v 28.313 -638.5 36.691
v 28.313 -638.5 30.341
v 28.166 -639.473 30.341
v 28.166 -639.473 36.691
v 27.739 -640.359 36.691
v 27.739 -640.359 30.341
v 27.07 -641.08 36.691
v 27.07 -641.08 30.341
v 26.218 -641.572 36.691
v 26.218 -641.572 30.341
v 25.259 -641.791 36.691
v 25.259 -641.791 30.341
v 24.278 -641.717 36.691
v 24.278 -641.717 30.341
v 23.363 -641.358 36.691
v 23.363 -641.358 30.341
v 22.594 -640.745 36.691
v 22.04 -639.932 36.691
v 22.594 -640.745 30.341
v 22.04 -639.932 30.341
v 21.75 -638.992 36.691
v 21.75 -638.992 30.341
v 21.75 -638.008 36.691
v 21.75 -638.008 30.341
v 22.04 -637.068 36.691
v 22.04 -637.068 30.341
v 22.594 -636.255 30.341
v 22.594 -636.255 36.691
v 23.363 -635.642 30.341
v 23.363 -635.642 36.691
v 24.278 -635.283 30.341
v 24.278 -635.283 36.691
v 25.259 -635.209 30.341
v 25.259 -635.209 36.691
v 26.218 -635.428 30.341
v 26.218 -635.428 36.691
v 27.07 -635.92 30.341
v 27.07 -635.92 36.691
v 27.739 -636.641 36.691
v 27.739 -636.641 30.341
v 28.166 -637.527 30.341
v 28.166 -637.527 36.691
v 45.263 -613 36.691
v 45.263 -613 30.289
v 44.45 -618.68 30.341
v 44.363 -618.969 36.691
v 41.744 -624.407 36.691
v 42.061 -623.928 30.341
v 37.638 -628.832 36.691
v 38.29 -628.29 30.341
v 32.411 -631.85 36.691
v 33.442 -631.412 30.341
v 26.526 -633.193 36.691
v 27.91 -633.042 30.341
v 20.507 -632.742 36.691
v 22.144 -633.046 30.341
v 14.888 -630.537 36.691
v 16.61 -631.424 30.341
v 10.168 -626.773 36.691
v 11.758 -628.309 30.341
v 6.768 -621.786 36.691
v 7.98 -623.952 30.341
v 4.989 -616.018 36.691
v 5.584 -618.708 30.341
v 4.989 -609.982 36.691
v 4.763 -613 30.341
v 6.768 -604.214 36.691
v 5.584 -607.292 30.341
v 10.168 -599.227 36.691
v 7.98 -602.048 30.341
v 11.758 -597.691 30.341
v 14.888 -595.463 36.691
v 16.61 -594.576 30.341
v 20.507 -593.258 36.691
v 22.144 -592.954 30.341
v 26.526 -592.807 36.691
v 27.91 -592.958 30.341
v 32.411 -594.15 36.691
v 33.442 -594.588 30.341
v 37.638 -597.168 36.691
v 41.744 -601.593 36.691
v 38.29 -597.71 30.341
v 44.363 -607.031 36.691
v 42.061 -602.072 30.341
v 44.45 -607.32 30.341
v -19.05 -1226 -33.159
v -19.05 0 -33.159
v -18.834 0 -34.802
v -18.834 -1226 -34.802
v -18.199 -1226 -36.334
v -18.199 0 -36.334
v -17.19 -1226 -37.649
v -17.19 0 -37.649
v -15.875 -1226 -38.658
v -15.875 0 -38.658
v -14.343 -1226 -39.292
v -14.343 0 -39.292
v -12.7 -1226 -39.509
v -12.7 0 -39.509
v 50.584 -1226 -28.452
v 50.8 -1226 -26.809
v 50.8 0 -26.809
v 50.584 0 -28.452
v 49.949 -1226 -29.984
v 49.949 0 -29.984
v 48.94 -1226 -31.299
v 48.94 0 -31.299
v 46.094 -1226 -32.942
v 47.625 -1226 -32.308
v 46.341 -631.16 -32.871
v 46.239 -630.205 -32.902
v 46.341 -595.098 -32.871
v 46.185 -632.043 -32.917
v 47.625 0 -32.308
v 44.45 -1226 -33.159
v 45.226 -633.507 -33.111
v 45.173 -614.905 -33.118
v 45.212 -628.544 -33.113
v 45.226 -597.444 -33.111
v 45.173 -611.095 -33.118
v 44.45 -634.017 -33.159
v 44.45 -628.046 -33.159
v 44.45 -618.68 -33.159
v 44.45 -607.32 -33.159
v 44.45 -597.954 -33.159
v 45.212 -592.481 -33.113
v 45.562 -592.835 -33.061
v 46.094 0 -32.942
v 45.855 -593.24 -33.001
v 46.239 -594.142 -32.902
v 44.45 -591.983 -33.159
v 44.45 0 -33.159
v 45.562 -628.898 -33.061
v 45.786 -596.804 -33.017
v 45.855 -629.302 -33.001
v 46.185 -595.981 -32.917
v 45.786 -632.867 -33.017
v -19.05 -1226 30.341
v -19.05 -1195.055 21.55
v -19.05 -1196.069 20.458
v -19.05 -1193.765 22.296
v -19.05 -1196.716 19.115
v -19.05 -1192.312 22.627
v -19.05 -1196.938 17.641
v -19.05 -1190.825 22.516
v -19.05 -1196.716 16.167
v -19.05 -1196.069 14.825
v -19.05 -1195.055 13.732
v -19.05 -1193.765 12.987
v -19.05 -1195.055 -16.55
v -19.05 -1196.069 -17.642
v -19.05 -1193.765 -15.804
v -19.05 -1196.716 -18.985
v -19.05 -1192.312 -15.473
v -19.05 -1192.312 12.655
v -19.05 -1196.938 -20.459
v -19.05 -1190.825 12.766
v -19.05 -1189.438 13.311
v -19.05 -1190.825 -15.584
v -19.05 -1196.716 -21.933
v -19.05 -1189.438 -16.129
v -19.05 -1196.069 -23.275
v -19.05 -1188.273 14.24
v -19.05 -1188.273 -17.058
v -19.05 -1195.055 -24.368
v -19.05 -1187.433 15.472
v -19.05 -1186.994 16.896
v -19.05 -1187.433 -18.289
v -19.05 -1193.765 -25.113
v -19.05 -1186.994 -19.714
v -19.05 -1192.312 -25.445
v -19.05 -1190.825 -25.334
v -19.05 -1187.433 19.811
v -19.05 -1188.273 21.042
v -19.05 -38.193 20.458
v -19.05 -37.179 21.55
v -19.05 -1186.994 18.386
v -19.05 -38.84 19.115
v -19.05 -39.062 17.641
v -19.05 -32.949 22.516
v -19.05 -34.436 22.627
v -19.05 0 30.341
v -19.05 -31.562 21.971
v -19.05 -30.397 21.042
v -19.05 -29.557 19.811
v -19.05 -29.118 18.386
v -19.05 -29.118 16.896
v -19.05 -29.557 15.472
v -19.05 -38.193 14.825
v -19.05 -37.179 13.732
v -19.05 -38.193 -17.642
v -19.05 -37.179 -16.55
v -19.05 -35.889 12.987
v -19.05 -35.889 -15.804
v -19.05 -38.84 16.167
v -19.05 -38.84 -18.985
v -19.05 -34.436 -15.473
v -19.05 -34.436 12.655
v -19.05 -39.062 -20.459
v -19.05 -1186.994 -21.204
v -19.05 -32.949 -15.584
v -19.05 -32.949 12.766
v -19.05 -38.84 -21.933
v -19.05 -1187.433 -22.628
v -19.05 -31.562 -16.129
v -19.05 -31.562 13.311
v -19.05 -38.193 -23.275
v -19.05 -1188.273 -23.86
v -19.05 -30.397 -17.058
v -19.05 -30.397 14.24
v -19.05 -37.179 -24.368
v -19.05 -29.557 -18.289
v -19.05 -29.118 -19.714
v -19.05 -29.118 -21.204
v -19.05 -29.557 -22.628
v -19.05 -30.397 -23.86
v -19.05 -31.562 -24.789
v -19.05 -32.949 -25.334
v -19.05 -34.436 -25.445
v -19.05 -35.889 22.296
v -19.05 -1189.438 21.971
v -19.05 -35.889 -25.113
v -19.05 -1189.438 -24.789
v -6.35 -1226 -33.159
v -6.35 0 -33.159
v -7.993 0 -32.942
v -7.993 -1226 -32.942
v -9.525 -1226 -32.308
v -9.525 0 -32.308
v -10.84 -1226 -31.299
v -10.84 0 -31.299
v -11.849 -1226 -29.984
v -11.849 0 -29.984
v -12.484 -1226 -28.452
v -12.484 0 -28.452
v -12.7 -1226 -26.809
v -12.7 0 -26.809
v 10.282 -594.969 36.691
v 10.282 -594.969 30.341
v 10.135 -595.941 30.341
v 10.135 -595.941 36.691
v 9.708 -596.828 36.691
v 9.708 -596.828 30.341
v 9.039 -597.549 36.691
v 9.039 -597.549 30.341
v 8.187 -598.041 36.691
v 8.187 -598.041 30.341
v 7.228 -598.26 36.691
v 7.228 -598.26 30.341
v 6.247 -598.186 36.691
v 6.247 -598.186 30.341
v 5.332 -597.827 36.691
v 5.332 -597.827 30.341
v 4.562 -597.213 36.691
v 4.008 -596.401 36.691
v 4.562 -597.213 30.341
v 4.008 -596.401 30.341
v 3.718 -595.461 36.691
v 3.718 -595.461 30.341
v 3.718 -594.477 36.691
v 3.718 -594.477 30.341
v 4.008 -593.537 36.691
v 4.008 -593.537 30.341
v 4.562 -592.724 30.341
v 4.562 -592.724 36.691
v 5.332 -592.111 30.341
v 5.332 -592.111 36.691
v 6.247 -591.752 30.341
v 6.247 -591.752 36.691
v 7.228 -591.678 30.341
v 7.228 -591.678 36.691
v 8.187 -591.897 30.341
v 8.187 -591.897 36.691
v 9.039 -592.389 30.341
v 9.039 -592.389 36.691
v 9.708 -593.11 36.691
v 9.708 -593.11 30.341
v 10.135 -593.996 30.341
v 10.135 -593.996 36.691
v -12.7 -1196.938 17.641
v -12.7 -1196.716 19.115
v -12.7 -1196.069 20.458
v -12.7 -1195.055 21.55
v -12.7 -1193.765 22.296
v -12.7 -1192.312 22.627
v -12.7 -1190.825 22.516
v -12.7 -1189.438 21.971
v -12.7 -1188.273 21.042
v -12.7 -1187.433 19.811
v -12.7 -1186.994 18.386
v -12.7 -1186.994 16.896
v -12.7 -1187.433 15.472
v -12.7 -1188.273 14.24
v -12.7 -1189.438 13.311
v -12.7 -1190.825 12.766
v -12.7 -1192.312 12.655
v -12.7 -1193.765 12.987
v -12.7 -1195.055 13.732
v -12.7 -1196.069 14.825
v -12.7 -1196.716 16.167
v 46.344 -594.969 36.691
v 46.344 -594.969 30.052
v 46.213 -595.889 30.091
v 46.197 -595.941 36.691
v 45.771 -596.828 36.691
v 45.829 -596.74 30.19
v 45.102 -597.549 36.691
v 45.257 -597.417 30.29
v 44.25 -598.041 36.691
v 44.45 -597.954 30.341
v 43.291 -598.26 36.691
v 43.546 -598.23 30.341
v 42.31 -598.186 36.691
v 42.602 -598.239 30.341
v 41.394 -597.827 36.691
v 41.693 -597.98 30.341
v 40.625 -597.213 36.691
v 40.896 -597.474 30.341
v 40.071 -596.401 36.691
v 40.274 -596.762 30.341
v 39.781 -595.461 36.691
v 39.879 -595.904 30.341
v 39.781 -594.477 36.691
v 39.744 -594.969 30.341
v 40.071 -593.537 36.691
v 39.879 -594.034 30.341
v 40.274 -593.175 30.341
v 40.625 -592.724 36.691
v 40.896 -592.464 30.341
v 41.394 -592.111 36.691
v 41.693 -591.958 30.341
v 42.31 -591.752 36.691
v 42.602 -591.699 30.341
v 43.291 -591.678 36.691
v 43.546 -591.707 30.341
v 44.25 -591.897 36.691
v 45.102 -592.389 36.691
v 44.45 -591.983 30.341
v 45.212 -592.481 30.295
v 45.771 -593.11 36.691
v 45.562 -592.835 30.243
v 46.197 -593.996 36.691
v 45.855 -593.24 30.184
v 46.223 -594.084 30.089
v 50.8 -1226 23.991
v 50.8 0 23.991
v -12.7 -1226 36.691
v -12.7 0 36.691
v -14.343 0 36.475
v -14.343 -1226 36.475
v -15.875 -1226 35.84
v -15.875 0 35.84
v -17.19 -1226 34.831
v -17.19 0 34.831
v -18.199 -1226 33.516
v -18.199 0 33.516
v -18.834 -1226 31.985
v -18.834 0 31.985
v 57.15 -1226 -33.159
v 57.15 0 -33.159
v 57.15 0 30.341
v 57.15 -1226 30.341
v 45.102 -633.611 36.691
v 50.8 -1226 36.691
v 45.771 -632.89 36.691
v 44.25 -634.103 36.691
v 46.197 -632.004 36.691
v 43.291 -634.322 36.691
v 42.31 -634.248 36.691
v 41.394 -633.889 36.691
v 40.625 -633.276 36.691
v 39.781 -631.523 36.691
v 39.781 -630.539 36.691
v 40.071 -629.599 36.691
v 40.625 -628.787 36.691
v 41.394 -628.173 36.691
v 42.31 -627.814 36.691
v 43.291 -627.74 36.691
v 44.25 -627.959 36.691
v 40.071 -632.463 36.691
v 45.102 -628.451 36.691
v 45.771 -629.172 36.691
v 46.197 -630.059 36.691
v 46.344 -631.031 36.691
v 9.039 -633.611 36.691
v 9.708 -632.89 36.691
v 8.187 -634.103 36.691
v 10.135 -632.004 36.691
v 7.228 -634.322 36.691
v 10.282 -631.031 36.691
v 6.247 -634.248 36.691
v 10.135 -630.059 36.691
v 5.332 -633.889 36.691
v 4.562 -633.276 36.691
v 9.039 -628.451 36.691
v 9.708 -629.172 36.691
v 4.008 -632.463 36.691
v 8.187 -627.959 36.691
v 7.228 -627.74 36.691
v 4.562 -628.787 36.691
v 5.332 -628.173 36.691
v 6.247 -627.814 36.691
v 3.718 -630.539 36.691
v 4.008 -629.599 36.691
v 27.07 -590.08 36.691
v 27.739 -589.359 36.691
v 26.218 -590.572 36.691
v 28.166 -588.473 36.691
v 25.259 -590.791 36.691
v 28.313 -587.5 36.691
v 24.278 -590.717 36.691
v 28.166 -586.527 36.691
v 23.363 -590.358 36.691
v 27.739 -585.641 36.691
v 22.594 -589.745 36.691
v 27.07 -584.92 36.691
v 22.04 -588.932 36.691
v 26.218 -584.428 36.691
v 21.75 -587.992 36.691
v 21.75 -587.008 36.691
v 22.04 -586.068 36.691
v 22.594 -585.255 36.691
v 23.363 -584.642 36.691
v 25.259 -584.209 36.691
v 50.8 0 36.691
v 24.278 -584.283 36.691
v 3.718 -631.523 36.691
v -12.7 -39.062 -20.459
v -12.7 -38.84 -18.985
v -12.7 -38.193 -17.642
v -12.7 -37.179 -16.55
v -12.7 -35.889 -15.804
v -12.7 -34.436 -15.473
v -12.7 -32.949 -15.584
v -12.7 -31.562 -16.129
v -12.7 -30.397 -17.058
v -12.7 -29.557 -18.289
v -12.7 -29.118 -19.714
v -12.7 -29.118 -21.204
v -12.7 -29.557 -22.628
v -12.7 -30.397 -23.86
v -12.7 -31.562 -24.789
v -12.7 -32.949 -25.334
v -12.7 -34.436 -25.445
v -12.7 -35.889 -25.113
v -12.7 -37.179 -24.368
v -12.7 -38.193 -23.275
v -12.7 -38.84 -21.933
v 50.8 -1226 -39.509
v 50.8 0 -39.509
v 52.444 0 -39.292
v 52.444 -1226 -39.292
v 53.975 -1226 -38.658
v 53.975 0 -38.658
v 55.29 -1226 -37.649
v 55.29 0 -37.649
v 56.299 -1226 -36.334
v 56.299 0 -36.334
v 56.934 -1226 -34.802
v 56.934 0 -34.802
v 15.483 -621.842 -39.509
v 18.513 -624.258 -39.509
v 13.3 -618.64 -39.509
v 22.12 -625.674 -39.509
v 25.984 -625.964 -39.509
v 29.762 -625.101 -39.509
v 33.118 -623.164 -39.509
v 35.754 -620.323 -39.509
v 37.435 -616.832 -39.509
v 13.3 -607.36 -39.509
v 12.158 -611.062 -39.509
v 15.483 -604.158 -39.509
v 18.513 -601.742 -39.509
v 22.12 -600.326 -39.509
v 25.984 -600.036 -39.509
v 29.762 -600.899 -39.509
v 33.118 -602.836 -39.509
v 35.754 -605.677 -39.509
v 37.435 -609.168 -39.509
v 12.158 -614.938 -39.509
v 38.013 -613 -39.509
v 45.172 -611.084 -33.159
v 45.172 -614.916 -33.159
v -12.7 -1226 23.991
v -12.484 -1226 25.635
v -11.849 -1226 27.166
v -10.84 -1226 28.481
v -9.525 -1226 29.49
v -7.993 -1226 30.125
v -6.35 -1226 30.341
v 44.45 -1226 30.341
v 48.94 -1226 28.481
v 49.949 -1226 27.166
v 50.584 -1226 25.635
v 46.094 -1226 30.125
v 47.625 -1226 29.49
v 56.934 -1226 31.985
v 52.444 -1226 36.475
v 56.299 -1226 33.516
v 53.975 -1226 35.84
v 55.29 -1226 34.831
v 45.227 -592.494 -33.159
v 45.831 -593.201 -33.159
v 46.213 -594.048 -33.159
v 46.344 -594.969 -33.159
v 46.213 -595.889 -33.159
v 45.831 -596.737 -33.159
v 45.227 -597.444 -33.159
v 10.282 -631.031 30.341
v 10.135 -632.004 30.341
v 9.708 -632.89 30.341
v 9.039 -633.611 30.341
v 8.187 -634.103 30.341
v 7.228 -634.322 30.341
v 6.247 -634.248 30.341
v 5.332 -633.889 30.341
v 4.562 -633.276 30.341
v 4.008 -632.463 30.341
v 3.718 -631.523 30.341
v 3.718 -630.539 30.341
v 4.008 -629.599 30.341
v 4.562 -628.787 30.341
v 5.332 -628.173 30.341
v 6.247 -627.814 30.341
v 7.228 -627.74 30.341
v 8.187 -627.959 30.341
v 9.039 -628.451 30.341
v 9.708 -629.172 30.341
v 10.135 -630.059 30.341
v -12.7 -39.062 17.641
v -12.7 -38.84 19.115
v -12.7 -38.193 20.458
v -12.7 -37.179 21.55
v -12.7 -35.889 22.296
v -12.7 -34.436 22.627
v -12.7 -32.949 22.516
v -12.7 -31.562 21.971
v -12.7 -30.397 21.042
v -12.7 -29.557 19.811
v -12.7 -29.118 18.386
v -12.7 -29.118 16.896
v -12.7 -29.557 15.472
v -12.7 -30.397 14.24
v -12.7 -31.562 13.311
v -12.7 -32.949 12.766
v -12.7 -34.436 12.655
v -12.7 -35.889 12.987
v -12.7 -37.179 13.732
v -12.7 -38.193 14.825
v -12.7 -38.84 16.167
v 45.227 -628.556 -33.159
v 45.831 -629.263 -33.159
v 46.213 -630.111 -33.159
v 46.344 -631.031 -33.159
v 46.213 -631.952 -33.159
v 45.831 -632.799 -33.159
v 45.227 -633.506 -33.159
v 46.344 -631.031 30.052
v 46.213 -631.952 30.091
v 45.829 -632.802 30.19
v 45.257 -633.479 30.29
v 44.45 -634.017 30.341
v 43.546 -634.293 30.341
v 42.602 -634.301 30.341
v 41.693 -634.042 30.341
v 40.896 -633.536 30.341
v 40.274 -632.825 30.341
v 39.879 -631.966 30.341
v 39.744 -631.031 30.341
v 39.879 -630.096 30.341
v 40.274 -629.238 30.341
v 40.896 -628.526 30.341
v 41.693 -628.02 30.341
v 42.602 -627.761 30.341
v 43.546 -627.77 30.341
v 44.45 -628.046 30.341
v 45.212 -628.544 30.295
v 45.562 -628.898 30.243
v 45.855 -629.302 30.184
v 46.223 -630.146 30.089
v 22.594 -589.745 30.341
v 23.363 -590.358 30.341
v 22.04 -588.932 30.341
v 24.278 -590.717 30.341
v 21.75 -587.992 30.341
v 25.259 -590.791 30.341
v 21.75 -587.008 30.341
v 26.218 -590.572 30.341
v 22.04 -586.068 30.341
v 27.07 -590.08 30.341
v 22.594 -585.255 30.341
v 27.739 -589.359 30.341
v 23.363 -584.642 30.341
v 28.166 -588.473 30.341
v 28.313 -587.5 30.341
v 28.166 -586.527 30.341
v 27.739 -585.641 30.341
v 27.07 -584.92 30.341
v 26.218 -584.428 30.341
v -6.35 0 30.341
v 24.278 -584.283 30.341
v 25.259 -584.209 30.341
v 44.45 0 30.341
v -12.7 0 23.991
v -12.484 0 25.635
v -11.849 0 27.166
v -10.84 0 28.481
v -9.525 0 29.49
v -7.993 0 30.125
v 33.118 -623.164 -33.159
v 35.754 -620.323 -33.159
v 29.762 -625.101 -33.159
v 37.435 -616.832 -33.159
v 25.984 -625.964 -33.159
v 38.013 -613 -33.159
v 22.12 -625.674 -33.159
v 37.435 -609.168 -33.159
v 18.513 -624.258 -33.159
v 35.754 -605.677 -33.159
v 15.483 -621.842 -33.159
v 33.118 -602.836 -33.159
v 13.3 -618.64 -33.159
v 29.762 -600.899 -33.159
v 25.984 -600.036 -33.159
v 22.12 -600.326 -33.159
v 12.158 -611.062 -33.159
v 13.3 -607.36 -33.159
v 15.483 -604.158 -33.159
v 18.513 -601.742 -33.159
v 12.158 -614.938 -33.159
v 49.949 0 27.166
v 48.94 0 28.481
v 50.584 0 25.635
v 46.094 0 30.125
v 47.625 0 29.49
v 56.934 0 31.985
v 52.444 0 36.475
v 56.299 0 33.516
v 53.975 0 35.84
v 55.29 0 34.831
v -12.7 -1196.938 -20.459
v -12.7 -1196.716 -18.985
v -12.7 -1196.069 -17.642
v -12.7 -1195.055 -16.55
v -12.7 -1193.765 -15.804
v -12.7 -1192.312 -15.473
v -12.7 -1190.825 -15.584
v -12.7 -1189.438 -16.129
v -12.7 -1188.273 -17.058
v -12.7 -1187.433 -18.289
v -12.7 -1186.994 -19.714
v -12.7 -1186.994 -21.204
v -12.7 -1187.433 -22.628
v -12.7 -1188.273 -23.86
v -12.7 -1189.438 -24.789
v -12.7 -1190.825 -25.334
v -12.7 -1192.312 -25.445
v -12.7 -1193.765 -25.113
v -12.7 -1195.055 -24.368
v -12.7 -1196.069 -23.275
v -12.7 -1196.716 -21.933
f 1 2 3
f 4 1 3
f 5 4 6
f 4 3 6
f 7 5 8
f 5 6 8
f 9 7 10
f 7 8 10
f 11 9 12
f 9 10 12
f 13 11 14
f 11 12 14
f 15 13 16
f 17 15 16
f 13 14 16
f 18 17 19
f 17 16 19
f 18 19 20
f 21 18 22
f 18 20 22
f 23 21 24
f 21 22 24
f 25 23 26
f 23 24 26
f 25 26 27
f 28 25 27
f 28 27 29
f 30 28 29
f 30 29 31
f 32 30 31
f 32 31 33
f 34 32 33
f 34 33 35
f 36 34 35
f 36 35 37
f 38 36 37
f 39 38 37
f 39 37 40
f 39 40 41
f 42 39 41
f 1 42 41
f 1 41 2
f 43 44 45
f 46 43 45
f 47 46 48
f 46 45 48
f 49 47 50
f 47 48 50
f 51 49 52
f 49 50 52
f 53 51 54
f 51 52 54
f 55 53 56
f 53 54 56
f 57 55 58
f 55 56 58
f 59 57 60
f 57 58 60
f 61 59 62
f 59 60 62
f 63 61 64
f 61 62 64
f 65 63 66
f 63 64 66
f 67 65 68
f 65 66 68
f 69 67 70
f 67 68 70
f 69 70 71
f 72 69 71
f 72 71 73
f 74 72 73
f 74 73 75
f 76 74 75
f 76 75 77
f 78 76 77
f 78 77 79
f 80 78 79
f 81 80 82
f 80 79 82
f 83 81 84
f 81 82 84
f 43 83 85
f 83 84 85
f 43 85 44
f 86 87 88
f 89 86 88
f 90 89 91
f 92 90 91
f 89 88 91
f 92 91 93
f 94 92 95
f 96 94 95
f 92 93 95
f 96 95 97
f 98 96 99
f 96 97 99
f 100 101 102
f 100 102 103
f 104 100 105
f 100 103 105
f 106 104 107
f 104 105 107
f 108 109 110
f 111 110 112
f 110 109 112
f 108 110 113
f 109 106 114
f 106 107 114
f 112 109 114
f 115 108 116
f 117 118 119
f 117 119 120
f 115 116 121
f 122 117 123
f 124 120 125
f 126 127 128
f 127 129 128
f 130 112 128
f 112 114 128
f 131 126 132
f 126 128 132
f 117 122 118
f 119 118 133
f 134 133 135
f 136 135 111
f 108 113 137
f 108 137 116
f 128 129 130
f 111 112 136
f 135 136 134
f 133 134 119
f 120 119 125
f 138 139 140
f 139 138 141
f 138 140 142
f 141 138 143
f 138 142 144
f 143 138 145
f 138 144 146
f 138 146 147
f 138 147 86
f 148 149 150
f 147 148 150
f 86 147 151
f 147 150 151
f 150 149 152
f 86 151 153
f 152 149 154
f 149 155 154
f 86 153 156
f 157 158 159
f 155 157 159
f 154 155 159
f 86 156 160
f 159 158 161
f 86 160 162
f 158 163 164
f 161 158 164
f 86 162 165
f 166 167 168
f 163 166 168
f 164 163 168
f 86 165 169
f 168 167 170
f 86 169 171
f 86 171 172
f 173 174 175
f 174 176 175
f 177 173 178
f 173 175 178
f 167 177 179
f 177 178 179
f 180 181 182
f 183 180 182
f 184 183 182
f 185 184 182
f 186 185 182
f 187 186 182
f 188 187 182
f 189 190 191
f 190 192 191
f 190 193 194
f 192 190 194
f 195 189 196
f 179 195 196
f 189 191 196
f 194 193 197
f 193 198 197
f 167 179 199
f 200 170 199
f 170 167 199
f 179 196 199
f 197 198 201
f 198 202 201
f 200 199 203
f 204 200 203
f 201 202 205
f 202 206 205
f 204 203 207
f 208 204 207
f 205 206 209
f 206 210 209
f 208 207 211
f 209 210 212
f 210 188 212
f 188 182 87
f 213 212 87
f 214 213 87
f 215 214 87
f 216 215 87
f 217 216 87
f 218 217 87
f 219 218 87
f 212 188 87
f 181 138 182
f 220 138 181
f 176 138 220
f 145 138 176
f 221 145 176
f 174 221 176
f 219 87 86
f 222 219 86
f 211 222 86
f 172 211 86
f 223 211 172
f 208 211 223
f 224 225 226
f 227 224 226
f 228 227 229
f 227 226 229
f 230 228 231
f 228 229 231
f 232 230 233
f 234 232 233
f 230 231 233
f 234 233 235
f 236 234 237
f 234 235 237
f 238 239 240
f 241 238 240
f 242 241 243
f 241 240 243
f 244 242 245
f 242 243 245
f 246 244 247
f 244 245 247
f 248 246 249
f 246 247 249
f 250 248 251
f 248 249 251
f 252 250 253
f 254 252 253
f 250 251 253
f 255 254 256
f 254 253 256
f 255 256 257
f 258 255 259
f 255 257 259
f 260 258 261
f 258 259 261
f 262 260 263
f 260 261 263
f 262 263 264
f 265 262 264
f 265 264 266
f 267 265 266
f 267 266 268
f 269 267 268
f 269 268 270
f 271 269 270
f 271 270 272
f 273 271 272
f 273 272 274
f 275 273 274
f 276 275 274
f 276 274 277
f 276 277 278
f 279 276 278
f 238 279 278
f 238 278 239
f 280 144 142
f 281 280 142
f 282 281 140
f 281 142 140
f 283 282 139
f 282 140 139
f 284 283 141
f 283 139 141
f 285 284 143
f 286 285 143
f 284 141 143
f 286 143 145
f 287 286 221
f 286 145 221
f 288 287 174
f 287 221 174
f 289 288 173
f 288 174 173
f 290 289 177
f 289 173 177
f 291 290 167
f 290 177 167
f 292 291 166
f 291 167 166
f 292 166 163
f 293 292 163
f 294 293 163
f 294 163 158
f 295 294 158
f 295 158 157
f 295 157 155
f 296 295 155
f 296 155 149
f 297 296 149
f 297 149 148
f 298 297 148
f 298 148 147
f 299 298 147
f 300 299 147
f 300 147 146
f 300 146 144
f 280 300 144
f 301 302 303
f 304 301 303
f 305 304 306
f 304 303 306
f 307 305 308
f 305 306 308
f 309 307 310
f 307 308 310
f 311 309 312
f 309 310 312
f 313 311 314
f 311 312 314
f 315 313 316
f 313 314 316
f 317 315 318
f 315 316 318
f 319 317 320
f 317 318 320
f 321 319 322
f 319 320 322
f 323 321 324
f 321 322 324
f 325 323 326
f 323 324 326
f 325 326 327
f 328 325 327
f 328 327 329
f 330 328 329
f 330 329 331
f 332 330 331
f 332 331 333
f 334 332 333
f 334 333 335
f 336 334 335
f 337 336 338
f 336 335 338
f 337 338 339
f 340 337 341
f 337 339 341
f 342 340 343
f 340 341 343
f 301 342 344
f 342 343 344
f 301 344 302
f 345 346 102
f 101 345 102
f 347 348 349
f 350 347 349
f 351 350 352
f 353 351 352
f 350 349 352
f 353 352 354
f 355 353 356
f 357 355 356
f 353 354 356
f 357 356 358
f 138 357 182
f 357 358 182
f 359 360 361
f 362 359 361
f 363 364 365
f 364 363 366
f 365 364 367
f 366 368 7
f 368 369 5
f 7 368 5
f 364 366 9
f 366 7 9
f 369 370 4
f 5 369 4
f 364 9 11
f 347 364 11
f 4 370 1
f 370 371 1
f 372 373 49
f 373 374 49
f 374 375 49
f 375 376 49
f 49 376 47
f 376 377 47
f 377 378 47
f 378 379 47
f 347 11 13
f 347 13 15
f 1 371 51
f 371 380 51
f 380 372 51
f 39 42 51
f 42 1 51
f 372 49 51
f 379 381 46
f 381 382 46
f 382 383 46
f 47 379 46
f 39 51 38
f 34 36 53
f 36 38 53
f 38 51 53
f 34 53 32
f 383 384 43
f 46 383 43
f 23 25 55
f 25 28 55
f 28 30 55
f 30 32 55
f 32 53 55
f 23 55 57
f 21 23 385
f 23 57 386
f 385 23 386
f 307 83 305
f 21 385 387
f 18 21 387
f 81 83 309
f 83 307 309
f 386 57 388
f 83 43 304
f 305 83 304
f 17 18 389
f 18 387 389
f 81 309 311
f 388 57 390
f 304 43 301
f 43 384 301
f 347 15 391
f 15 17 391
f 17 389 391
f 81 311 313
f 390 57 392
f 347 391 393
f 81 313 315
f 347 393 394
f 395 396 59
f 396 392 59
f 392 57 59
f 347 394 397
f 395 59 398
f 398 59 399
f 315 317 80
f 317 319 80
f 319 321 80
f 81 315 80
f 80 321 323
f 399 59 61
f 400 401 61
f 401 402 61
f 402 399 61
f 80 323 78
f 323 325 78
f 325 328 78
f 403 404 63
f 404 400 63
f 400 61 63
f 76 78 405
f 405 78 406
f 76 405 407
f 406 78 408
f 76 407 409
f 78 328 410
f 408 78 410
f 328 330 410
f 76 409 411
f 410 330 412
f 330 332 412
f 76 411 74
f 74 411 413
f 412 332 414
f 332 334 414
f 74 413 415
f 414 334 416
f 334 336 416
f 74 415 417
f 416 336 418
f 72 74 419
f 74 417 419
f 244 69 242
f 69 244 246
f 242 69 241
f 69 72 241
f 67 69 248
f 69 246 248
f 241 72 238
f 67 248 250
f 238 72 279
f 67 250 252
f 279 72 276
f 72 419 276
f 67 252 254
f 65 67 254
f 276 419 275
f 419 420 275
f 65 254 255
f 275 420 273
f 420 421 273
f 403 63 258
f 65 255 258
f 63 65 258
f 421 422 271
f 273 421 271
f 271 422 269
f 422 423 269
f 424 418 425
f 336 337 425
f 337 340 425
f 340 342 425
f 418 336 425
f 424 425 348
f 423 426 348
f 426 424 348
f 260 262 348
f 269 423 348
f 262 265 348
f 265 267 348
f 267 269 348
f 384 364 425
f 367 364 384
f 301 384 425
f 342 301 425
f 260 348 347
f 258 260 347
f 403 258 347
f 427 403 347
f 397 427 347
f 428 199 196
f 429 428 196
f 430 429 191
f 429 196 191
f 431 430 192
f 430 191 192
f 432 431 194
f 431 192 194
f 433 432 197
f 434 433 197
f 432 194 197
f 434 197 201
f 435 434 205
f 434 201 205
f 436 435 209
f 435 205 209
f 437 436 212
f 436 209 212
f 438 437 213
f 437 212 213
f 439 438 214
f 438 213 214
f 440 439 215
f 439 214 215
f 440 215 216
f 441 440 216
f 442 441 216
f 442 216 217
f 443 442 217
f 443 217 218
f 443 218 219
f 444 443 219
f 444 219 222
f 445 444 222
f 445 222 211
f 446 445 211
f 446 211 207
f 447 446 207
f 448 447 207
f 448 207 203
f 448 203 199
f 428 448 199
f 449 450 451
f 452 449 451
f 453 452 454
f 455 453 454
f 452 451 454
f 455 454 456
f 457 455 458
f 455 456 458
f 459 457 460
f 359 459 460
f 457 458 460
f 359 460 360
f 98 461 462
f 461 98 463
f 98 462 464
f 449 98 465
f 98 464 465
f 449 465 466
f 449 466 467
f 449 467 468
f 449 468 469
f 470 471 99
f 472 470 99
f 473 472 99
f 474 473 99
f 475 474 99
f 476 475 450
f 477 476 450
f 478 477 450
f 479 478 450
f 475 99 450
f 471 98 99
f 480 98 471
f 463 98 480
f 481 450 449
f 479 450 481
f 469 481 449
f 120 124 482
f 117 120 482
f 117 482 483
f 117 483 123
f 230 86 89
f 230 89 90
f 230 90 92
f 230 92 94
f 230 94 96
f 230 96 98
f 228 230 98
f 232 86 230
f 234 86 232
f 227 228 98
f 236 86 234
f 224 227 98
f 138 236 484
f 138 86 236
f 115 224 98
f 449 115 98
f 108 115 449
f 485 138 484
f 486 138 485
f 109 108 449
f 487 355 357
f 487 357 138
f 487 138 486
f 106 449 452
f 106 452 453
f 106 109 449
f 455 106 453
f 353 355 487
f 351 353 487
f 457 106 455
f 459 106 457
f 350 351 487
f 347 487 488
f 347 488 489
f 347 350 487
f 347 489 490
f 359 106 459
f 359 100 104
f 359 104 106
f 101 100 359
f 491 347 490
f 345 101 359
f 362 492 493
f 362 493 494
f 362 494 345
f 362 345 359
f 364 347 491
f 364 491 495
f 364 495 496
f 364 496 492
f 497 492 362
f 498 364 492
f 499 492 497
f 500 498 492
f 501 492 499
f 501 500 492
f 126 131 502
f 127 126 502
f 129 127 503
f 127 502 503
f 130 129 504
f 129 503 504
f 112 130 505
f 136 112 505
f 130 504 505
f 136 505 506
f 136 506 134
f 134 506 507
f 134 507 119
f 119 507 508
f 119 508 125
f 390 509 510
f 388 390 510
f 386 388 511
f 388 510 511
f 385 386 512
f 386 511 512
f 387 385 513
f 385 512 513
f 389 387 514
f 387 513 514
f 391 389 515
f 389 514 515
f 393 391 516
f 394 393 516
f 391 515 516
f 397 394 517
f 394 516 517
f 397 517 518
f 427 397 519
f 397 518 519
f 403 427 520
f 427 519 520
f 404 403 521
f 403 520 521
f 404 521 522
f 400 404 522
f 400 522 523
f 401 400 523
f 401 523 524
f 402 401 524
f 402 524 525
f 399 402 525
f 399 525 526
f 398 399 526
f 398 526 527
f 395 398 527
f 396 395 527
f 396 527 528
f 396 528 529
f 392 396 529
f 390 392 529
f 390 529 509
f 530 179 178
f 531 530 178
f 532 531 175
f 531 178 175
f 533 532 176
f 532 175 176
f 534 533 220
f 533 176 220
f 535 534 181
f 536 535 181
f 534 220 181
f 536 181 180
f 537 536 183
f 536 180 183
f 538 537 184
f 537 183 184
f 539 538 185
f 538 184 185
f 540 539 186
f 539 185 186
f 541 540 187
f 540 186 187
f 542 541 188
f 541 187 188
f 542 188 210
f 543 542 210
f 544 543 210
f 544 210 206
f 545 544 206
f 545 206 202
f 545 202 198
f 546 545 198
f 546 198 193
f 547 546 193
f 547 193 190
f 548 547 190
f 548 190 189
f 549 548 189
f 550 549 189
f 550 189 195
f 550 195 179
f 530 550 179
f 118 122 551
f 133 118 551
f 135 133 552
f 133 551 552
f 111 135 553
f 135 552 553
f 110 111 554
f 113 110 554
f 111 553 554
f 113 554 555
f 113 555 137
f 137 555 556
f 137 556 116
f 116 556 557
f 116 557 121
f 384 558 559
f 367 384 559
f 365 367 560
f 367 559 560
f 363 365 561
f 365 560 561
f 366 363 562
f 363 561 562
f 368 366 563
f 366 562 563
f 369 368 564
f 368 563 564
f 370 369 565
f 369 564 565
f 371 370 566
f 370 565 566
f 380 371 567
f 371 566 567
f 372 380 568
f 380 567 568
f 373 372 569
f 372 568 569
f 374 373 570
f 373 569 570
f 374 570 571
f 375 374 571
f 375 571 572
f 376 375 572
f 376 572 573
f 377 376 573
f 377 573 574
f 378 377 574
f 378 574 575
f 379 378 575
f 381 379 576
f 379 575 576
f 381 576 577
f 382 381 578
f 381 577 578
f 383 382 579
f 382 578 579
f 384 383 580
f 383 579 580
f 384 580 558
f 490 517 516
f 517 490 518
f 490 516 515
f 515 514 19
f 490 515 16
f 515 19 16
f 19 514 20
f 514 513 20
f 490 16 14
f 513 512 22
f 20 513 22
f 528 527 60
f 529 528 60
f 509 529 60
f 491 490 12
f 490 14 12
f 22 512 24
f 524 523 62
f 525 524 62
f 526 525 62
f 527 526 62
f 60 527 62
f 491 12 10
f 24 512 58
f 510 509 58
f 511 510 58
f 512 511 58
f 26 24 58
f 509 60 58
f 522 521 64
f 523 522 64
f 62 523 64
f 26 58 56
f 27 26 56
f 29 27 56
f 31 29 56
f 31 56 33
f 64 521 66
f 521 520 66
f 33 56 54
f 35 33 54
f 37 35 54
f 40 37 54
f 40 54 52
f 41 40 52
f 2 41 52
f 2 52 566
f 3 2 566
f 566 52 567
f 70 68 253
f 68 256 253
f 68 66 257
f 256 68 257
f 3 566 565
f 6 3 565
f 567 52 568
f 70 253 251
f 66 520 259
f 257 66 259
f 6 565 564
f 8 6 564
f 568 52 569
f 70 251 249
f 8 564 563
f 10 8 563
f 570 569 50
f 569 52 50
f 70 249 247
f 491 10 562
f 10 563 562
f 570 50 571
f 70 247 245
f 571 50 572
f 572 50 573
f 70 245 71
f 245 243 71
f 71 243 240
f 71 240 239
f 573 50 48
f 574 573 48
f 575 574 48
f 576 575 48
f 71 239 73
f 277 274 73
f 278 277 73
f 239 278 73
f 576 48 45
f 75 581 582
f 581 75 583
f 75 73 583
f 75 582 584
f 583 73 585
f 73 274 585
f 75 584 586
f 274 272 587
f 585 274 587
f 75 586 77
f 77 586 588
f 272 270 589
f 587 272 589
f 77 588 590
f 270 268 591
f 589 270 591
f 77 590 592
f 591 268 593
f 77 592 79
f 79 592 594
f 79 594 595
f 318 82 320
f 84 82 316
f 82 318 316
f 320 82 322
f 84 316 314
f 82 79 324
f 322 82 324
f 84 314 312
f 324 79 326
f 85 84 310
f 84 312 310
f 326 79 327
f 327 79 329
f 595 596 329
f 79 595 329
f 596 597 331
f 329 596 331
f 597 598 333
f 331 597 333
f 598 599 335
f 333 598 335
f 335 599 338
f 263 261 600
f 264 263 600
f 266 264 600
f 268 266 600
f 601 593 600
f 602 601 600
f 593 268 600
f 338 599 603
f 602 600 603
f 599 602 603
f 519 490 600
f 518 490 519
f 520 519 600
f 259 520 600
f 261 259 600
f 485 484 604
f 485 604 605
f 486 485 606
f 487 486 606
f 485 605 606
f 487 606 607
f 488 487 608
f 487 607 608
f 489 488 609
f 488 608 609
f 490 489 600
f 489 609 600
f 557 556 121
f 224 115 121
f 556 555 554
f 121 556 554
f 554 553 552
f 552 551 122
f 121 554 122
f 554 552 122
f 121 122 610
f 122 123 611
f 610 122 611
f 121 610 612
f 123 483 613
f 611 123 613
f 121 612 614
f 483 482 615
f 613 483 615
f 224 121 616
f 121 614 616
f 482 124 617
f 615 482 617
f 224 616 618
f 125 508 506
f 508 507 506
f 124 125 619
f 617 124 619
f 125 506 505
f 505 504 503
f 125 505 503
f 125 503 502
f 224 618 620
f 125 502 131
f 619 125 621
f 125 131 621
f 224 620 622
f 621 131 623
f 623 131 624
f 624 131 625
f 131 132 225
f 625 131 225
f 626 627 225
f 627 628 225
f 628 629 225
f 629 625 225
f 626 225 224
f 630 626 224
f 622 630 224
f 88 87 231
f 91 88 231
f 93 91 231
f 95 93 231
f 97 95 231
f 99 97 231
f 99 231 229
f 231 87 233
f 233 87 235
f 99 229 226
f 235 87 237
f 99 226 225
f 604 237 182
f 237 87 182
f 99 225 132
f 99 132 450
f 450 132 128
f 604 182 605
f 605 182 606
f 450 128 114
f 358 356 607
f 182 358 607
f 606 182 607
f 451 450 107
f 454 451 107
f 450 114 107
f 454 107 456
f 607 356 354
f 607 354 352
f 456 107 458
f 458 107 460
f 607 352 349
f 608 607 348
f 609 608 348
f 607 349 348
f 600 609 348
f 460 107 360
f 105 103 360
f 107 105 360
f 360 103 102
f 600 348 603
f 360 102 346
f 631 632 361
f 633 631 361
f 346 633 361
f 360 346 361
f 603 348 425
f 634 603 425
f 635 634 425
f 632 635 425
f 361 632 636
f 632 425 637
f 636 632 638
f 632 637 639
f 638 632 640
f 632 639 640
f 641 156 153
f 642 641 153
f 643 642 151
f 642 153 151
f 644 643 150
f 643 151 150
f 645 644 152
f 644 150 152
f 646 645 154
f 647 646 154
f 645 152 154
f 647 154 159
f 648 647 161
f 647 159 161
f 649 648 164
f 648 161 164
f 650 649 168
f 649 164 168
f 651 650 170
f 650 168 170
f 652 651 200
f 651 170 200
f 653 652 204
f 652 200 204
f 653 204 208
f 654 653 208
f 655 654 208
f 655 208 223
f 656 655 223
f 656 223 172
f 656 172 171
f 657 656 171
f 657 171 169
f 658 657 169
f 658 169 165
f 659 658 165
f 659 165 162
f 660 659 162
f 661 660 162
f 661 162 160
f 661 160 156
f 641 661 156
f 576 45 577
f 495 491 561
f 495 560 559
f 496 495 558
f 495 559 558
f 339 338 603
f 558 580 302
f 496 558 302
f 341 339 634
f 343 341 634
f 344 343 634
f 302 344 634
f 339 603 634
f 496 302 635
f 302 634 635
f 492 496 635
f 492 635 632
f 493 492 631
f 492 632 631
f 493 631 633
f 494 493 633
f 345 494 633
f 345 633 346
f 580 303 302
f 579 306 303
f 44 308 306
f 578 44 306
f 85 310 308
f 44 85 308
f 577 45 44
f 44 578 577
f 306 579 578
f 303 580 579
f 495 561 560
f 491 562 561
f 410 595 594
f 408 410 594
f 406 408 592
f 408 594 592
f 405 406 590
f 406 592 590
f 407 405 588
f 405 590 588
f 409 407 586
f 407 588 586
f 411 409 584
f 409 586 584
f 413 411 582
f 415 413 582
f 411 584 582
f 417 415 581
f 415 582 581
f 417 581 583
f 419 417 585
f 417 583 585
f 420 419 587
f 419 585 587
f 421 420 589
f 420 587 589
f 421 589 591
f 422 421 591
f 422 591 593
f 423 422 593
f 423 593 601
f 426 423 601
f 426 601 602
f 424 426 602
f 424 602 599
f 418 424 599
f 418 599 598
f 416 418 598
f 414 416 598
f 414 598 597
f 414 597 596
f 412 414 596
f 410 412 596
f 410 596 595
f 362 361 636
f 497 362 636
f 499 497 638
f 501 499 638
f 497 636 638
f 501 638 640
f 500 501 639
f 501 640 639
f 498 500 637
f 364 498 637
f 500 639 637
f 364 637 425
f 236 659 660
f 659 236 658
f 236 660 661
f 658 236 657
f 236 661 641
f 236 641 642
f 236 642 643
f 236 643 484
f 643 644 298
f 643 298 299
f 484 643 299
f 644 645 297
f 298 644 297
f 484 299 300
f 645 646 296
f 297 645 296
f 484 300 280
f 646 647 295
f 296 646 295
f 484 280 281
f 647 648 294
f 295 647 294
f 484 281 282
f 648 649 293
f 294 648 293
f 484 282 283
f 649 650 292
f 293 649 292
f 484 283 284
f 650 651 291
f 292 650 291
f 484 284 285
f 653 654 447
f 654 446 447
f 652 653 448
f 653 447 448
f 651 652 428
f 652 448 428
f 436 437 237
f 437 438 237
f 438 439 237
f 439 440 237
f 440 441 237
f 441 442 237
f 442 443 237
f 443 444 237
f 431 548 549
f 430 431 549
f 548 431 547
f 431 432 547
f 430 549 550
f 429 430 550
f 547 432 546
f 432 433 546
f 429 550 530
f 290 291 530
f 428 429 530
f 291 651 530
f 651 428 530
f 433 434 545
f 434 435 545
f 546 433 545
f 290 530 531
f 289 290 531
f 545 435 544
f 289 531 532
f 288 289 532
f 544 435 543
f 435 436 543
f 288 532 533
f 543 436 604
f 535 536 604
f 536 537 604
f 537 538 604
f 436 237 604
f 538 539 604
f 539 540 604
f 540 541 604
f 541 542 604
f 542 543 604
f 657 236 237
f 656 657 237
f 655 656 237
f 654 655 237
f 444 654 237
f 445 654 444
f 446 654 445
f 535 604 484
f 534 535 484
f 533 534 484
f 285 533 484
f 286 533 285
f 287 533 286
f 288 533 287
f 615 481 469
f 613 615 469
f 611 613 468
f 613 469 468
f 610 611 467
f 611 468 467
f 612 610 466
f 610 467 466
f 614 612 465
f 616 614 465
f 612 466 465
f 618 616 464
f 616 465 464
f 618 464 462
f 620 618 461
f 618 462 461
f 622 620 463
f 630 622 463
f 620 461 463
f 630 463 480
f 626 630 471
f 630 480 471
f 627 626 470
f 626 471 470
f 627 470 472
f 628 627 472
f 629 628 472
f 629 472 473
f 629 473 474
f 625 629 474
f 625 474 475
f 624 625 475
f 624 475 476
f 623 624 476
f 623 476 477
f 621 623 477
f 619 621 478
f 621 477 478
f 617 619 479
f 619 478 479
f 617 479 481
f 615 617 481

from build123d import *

# Parameters (mm, degrees)
F1_DEPTH = 1226
F2_R     = 5
F3_DEPTH = 25.4
F4_R     = 3.3
F4_R_2   = 20.25
F5_DEPTH = 76.201
F6_W     = 51.969446
F6_H     = 157.89732
F6_R     = 13
F7_DEPTH = 6.35


with BuildPart() as f1:
    # F0 (on Front) → F1 (new body)
    with BuildSketch(Plane.XZ):
        with BuildLine():
            Line((50.800001, 36.691132), (-12.699999, 36.691132))
            ThreePointArc((-12.699999, 36.691132), (-17.190127, 34.83126), (-19.049999, 30.341132))
            Line((-19.049999, 30.341132), (-19.049999, -33.158868))
            ThreePointArc((-19.049999, -33.158868), (-17.190127, -37.648996), (-12.699999, -39.508868))
            Line((-12.699999, -39.508868), (50.800001, -39.508868))
            ThreePointArc((50.800001, -39.508868), (55.290129, -37.648996), (57.150001, -33.158868))
            Line((57.150001, -33.158868), (57.150001, 30.341132))
            ThreePointArc((57.150001, 30.341132), (55.290129, 34.83126), (50.800001, 36.691132))
        make_face()
        with BuildLine():
            ThreePointArc((-12.699999, 23.991132), (-10.840127, 28.48126), (-6.349999, 30.341132))
            Line((-6.349999, 30.341132), (44.450001, 30.341132))
            ThreePointArc((44.450001, 30.341132), (48.940129, 28.48126), (50.800001, 23.991132))
            Line((50.800001, 23.991132), (50.800001, -26.808868))
            ThreePointArc((50.800001, -26.808868), (48.940129, -31.298996), (44.450001, -33.158868))
            Line((44.450001, -33.158868), (-6.349999, -33.158868))
            ThreePointArc((-6.349999, -33.158868), (-10.840127, -31.298996), (-12.699999, -26.808868))
            Line((-12.699999, -26.808868), (-12.699999, 23.991132))
        make_face(mode=Mode.SUBTRACT)
    extrude(amount=F1_DEPTH)

    # F2 (on face) → F3 (cut)
    with BuildSketch(Plane(origin=(-19.049999, 0, 0), x_dir=(0, -1, 0), z_dir=(-1, 0, 0))):
        with Locations((34.062, 17.641132)):
            Circle(F2_R)
        with Locations((34.062, -20.458868)):
            Circle(F2_R)
        with Locations((1191.938, -20.458868)):
            Circle(F2_R)
        with Locations((1191.938, 17.641132)):
            Circle(F2_R)
    extrude(amount=-F3_DEPTH, mode=Mode.SUBTRACT)

    # F4 (on face) → F5 (cut, through all)
    with BuildSketch(Plane(origin=(0, 0, -39.508868), x_dir=(1, 0, 0), z_dir=(0, 0, -1))):
        with Locations((25.012778, 638.5)):
            Circle(F4_R)
        with Locations((6.981556, 631.031223)):
            Circle(F4_R)
        with Locations((6.981556, 594.968777)):
            Circle(F4_R)
        with Locations((25.012778, 587.5)):
            Circle(F4_R)
        with Locations((43.044001, 594.968777)):
            Circle(F4_R)
        with Locations((43.044001, 631.031223)):
            Circle(F4_R)
        with Locations((25.012778, 613)):
            Circle(F4_R_2)
    extrude(amount=-F5_DEPTH, mode=Mode.SUBTRACT)

    # F6 (on face) → F7 (join)
    with BuildSketch(Plane(origin=(0, 0, -39.508868), x_dir=(1, 0, 0), z_dir=(0, 0, -1))):
        with Locations((22.14342, 620.64044)):
            Rectangle(F6_W, F6_H)
        with Locations((25.012778, 613)):
            Circle(F6_R, mode=Mode.SUBTRACT)
    extrude(amount=-F7_DEPTH)


solid = f1.part
